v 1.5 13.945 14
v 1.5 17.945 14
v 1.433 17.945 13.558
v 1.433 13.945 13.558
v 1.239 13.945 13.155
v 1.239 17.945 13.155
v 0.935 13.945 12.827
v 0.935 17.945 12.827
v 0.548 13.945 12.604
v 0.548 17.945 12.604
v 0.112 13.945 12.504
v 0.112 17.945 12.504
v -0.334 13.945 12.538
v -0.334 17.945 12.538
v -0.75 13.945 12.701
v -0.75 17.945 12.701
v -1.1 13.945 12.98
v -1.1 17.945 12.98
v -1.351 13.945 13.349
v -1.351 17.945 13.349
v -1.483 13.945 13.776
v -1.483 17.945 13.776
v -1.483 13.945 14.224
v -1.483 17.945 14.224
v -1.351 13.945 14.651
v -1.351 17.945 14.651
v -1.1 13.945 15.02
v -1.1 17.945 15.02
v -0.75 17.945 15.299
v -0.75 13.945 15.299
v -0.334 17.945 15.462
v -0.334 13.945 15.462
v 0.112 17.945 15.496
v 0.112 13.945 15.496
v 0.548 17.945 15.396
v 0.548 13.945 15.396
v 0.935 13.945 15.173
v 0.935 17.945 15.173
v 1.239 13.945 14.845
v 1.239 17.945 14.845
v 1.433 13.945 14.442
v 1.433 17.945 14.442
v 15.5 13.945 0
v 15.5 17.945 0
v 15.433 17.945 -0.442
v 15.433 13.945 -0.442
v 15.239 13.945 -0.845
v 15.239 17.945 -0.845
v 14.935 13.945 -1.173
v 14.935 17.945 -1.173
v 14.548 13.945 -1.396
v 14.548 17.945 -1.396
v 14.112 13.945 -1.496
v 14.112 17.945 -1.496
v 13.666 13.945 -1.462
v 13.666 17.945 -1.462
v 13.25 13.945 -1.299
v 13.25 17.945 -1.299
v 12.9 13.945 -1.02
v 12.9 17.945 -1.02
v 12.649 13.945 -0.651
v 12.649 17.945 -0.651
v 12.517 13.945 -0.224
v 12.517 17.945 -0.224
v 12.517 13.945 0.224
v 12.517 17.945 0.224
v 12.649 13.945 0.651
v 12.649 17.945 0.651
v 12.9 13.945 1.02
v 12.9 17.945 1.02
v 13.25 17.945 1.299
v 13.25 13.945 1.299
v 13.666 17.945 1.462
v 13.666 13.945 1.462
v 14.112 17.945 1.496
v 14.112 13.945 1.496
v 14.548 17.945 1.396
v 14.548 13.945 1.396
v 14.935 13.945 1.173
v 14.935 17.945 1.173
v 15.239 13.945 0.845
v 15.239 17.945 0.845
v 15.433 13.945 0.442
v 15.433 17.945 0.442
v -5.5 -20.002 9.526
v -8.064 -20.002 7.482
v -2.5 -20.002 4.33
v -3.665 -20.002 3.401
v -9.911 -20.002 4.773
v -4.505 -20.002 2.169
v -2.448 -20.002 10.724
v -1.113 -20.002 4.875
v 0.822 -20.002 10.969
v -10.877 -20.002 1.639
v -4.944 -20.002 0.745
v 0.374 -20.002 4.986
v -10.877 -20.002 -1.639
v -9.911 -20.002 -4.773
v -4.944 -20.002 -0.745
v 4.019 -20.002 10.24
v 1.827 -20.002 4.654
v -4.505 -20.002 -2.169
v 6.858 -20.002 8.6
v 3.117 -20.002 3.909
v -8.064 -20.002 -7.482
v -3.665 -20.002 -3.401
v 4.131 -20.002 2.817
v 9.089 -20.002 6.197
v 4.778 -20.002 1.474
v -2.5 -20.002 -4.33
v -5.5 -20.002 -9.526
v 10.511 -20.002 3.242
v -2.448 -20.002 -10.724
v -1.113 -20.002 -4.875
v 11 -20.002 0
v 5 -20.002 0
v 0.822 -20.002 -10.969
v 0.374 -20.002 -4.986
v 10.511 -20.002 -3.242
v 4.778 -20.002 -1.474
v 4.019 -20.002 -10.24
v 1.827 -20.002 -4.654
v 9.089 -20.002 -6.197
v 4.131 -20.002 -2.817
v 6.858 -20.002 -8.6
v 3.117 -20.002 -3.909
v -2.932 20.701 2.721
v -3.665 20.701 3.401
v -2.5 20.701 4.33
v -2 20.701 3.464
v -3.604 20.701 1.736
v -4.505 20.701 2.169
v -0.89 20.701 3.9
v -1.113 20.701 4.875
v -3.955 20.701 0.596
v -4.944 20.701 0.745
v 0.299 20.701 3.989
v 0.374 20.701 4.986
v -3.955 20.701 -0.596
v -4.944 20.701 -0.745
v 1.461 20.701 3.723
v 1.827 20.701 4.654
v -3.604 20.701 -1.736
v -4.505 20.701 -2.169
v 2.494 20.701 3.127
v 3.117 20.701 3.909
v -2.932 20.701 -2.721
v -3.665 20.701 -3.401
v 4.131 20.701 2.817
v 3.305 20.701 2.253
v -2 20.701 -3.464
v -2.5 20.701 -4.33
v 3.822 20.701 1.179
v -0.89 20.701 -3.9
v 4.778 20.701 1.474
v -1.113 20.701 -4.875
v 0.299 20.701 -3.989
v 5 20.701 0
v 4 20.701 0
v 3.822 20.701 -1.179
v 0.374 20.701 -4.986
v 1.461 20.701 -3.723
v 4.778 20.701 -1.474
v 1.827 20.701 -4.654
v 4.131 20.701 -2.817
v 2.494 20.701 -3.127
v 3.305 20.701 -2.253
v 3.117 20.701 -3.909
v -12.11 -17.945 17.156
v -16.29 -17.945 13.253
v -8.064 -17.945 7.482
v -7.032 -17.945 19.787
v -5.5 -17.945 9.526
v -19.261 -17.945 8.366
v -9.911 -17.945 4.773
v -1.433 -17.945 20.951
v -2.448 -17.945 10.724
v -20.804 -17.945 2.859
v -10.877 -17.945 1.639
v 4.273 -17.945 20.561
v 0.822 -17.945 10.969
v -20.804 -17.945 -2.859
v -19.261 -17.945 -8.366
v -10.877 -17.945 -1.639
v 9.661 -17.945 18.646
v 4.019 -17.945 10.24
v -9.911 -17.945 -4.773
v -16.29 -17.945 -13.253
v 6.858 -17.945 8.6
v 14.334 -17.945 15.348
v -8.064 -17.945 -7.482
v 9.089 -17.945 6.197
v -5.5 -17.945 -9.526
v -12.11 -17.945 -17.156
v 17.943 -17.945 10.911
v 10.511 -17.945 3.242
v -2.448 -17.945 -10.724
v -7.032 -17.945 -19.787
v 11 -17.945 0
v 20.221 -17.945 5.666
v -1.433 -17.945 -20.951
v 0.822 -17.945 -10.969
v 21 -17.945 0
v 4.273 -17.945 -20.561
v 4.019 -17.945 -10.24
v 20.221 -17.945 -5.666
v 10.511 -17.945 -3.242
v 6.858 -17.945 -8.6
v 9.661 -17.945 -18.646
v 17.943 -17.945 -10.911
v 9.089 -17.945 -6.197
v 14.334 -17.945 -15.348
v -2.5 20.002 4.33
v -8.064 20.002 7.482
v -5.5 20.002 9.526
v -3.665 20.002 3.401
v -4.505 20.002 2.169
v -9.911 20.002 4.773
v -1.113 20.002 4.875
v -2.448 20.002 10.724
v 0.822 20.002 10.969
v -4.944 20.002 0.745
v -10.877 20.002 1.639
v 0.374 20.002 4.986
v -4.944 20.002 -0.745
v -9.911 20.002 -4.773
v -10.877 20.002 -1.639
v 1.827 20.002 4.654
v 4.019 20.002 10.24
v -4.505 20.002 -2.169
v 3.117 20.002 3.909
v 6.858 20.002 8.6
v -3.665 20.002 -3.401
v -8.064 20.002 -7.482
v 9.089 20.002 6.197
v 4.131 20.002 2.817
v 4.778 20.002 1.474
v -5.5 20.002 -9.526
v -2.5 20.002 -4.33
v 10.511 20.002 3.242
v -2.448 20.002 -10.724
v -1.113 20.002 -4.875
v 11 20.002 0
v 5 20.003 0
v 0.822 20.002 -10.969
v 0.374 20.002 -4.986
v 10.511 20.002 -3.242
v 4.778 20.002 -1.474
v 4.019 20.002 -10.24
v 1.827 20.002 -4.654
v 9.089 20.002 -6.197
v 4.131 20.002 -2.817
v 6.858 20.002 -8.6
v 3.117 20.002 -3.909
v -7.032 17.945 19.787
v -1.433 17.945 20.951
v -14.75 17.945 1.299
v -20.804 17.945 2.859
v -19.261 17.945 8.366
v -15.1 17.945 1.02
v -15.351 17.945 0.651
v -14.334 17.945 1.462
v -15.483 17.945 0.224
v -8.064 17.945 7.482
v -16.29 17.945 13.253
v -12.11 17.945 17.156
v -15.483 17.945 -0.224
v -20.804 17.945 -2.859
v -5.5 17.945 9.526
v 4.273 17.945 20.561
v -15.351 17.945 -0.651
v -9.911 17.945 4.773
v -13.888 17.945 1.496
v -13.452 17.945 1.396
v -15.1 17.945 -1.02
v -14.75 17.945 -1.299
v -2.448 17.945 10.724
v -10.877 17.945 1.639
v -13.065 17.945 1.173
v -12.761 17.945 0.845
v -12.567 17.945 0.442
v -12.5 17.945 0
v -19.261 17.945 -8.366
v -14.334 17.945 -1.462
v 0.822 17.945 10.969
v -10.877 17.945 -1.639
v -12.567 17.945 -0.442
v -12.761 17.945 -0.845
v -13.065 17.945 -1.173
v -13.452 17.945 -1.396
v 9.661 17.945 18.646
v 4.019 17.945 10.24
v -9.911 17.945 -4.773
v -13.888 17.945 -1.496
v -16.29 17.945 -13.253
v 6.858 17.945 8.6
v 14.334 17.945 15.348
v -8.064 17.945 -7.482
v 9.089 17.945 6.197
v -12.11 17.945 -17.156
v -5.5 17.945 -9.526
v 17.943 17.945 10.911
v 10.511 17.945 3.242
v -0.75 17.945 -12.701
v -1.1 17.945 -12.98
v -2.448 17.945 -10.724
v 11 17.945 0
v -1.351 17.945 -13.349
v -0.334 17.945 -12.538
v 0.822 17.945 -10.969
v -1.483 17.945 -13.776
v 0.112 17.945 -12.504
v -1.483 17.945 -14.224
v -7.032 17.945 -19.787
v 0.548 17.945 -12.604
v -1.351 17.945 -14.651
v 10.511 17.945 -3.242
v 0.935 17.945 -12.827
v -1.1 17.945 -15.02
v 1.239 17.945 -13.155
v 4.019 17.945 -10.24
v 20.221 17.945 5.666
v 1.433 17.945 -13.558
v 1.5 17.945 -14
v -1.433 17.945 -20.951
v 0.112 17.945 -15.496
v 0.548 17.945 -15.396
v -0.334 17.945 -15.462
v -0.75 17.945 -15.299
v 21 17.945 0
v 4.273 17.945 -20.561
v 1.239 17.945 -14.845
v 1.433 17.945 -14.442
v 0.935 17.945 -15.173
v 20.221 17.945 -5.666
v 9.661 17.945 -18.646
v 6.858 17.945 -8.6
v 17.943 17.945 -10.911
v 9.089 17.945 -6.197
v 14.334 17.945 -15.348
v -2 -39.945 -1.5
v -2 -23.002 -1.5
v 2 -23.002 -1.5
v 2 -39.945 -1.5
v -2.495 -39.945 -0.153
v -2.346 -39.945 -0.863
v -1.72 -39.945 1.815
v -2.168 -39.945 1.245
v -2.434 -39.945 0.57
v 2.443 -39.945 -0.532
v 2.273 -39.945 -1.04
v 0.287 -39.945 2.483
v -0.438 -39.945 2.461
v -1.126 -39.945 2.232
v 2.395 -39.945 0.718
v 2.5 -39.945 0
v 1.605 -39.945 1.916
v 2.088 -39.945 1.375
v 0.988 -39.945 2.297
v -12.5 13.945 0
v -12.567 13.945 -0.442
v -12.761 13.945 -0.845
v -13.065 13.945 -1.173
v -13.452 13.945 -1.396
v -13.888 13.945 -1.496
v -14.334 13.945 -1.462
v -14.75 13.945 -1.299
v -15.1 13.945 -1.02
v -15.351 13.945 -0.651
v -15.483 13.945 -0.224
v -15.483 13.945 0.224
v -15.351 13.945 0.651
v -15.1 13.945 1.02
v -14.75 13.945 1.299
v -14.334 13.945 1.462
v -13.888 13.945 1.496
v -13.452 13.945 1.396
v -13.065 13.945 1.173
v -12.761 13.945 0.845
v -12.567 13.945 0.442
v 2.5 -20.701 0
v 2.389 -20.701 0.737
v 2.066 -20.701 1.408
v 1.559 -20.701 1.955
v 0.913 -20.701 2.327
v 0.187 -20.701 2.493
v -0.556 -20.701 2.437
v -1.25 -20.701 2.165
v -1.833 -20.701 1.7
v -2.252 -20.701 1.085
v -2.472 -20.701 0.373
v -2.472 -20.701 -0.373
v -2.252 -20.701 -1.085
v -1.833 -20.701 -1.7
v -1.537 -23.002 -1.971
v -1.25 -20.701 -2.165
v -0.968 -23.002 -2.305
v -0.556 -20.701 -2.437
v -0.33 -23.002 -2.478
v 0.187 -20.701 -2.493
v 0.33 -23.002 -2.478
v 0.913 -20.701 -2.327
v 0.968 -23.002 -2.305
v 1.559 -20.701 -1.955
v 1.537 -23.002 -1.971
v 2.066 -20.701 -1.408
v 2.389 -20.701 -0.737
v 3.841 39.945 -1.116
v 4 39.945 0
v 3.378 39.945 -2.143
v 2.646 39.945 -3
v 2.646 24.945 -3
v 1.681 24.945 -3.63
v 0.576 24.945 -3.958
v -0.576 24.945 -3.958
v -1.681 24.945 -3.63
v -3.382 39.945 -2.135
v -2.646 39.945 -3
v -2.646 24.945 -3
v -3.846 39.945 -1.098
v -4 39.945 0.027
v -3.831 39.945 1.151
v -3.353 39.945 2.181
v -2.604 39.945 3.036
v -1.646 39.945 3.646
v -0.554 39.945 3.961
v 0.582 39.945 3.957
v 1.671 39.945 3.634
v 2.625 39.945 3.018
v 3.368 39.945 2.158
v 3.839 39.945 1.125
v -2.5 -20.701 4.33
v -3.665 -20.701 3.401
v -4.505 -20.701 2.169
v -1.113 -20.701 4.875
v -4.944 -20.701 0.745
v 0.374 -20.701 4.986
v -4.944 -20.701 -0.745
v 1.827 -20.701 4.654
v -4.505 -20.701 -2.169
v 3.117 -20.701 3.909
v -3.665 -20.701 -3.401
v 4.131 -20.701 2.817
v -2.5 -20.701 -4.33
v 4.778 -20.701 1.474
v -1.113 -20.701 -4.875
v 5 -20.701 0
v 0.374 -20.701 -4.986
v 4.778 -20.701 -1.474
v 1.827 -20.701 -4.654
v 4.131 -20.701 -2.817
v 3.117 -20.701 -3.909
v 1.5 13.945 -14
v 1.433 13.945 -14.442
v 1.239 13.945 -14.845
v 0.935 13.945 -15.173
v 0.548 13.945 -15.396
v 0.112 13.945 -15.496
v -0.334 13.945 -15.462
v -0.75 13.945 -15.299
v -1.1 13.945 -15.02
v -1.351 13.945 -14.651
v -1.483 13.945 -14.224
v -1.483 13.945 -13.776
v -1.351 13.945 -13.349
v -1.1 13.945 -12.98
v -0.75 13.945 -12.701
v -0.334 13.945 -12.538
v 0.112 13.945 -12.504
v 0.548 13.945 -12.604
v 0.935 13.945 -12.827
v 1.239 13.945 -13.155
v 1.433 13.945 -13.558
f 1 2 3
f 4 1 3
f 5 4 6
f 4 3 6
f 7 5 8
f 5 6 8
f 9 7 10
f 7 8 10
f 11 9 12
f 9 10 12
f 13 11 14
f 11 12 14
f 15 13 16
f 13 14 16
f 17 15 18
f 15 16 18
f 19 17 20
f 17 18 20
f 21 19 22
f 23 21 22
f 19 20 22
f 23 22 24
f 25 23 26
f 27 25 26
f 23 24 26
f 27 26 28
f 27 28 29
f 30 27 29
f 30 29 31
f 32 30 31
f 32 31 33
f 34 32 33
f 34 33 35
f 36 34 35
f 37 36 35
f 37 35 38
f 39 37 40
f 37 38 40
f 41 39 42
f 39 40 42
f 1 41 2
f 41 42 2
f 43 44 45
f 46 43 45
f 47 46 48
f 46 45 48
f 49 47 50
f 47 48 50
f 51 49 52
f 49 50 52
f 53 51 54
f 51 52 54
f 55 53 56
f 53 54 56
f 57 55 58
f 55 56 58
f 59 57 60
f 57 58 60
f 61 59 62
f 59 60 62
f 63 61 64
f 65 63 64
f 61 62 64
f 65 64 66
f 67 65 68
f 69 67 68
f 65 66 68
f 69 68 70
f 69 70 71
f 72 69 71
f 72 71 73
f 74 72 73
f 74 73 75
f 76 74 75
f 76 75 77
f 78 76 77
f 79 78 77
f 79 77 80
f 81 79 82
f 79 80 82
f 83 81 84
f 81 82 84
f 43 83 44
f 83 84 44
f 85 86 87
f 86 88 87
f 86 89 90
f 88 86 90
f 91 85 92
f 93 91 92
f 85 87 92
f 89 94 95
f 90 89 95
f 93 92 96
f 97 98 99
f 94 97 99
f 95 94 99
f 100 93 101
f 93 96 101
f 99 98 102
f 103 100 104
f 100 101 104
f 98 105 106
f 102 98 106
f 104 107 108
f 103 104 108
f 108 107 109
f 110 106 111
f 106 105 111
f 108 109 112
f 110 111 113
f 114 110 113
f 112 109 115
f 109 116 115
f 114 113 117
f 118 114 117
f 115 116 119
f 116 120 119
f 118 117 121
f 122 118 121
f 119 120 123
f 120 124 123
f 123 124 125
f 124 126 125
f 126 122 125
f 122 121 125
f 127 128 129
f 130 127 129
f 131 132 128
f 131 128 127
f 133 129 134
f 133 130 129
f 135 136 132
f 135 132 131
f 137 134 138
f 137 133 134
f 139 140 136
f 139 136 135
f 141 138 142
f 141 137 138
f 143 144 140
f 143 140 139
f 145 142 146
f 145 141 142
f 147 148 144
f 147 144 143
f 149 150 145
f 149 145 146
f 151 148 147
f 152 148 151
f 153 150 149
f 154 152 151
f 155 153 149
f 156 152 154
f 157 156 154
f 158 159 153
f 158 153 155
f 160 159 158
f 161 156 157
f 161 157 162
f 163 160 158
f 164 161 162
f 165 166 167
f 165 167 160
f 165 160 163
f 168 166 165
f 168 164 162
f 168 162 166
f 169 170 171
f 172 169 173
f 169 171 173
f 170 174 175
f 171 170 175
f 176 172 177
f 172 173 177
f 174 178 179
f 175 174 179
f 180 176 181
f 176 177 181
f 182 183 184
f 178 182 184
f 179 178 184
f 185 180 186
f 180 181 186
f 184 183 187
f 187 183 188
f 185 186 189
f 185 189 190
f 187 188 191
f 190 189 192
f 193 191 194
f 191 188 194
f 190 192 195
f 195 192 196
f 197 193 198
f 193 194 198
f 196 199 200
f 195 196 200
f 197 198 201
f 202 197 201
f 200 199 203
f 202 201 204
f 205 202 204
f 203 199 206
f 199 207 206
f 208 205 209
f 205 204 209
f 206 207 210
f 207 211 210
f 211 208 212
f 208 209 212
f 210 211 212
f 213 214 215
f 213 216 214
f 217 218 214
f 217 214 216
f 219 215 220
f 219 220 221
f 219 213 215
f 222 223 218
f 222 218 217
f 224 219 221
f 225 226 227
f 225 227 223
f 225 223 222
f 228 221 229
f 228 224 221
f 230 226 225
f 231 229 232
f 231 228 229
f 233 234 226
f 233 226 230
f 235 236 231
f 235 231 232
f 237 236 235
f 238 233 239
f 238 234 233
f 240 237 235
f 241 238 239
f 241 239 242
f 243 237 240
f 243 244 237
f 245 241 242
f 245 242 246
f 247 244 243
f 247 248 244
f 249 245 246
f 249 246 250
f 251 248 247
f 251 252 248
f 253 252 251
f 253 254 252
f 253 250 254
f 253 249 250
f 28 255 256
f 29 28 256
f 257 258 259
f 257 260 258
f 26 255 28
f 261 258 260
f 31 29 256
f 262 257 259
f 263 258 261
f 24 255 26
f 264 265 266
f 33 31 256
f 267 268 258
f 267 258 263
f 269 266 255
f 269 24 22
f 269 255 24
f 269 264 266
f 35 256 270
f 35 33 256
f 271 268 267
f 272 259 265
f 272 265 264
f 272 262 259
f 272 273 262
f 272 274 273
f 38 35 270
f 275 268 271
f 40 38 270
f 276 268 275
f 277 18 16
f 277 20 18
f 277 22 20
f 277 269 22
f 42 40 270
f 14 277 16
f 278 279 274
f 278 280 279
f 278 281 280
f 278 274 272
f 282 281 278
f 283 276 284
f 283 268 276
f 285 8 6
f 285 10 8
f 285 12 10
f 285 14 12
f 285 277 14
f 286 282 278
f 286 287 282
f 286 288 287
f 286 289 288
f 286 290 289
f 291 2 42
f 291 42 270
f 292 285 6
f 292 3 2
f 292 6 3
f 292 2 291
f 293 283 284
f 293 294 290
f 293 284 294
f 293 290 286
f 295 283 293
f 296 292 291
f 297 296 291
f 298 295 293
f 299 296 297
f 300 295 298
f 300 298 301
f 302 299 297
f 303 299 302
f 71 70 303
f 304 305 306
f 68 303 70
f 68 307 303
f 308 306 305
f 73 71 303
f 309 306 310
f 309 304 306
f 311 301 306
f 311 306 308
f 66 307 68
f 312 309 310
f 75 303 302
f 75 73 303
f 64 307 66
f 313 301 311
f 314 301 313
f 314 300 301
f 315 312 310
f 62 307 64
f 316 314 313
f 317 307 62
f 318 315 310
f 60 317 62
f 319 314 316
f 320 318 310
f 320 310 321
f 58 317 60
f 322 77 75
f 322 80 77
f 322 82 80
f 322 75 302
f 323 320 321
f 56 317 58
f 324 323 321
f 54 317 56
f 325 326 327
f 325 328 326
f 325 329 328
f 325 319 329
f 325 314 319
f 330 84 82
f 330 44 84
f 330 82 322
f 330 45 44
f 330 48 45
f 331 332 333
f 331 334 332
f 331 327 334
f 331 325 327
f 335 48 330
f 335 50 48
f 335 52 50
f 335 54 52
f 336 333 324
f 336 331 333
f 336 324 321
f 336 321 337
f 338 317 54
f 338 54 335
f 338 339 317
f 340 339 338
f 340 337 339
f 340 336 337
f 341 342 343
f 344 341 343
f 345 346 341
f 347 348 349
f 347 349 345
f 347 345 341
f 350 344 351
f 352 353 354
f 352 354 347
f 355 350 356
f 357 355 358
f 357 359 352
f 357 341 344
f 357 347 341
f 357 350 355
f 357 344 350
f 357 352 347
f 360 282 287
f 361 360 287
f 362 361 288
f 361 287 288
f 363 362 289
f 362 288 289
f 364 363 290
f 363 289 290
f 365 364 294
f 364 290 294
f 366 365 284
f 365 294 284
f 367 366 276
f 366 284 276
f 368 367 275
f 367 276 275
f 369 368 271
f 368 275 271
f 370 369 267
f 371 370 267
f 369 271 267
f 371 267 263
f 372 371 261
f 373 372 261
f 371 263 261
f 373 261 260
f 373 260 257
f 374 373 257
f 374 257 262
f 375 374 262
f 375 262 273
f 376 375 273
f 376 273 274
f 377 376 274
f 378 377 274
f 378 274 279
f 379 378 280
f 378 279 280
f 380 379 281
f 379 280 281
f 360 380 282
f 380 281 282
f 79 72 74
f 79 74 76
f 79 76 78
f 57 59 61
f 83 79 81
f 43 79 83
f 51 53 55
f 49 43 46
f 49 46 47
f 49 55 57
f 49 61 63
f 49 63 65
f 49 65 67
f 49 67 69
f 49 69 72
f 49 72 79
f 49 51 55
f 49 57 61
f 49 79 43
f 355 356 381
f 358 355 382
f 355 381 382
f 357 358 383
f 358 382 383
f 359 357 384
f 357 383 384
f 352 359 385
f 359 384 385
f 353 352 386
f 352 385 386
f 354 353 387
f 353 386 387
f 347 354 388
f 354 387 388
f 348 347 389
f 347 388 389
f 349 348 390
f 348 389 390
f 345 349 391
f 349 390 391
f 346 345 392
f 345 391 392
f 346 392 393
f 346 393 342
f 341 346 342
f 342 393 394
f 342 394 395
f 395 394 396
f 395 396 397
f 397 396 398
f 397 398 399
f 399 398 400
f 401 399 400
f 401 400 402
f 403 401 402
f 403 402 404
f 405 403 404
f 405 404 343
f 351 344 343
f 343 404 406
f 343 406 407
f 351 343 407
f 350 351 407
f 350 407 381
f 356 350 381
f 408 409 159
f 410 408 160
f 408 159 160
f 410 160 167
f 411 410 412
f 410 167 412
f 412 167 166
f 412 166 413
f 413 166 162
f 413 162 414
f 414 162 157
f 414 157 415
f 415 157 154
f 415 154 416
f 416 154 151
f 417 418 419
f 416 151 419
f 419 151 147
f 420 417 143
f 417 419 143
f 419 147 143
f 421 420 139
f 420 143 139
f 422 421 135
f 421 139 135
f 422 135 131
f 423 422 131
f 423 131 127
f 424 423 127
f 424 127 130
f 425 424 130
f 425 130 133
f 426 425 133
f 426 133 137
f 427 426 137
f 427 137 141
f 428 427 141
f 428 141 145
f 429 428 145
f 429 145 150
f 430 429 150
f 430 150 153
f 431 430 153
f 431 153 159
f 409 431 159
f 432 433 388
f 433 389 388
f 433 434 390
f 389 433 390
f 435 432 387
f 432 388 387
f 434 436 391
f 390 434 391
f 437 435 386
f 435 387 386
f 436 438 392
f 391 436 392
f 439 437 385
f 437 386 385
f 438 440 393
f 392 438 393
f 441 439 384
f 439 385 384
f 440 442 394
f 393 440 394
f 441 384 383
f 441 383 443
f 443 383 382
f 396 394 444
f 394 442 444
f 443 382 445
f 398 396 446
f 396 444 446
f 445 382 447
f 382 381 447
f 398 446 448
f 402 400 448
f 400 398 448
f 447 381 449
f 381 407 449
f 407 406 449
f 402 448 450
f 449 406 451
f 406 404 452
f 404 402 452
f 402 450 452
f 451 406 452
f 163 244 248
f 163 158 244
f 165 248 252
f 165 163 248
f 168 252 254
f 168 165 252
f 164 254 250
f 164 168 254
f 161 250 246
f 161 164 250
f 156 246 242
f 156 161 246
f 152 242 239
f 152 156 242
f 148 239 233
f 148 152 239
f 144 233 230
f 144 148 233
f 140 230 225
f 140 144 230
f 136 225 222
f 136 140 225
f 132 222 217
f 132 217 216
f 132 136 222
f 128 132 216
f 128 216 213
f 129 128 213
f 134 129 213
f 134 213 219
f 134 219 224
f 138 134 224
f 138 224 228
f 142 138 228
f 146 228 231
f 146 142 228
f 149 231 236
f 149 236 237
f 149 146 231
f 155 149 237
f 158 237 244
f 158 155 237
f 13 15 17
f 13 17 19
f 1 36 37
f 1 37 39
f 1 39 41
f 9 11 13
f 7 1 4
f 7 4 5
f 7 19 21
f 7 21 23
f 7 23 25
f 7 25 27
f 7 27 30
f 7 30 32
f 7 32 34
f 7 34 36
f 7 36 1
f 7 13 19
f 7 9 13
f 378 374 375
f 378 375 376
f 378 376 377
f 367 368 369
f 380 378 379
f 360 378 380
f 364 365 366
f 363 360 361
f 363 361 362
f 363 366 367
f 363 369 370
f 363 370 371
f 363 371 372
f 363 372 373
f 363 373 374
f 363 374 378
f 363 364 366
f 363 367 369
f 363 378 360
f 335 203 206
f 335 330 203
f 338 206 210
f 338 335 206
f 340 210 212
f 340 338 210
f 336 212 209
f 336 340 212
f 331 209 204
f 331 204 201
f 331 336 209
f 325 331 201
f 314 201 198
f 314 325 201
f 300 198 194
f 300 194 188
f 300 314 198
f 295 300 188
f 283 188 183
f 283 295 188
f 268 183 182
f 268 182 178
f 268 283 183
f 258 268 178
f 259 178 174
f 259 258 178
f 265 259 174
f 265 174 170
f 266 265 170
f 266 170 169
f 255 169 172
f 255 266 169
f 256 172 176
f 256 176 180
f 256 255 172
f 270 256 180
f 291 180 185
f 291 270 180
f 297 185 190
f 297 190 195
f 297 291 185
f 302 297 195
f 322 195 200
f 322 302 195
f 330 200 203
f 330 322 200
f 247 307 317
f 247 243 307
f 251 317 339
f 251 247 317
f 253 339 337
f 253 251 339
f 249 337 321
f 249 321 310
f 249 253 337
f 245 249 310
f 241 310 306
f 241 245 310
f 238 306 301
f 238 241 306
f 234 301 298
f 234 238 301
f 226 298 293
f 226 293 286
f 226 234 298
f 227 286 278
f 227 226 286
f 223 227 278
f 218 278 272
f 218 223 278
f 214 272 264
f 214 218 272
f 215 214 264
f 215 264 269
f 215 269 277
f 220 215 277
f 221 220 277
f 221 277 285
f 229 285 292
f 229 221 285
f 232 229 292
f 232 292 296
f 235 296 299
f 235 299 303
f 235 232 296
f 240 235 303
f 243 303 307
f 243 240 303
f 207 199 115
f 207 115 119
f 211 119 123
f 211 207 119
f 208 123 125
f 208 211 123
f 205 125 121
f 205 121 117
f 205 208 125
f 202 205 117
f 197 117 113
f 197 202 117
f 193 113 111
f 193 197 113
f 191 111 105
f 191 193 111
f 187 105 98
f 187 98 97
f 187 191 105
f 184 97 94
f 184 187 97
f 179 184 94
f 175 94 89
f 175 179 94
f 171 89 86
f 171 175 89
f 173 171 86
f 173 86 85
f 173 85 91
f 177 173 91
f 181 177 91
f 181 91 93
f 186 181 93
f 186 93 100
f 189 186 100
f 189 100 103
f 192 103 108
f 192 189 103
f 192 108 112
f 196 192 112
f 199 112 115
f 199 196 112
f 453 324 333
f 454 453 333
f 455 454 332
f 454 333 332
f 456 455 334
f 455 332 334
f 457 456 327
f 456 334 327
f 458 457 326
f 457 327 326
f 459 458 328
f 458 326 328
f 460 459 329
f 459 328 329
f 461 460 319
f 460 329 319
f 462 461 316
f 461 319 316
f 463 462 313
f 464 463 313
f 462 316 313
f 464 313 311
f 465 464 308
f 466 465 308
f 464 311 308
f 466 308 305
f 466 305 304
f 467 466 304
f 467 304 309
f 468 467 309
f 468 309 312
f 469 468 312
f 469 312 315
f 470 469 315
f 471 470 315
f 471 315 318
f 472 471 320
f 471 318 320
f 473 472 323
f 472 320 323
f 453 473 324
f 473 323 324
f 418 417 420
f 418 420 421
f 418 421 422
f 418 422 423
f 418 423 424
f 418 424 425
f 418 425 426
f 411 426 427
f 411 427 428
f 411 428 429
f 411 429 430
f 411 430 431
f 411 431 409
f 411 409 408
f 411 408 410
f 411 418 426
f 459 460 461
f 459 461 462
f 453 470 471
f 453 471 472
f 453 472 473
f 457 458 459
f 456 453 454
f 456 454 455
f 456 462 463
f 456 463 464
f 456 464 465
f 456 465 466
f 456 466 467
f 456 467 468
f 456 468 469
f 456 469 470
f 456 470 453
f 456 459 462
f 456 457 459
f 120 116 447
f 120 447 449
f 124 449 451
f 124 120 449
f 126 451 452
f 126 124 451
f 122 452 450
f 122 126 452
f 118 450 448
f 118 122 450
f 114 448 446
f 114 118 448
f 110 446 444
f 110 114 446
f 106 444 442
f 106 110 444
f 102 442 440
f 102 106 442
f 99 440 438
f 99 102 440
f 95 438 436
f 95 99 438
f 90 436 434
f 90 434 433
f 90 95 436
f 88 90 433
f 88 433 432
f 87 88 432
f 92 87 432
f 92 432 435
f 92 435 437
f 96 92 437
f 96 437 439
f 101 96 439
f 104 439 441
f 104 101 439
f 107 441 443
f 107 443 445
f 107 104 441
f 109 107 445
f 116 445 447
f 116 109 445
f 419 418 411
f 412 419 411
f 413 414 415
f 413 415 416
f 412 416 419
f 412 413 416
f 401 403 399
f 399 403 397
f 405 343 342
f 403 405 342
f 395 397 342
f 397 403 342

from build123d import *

# Parameters (mm, degrees)
SKETCH1_R           = 21
BOSS_EXTRUDE1_DEPTH = 17.9451
BOSS_EXTRUDE2_START = -17.9451
SKETCH2_R           = 11
BOSS_EXTRUDE2_DEPTH = 20.0025
SKETCH3_R           = 4
BOSS_EXTRUDE4_DEPTH = 19.9426
CUT_EXTRUDE1_DEPTH  = 15
SKETCH5_R           = 1.5
CUT_EXTRUDE2_DEPTH  = 4
SKETCH6_R           = 2.5
BOSS_EXTRUDE5_DEPTH = 19.9426
CUT_EXTRUDE3_DEPTH  = 16.9426
SKETCH9_R           = 5
BOSS_EXTRUDE6_DEPTH = 20.701


with BuildPart() as part:
    # Sketch1 → Boss-Extrude1 (new body, symmetric)
    with BuildSketch(Plane(origin=(0, 0, 0), x_dir=(1, 0, 0), z_dir=(0, 1, 0))):
        Circle(SKETCH1_R)
    extrude(amount=BOSS_EXTRUDE1_DEPTH, both=True)

    # Sketch2 → Boss-Extrude2 (add, symmetric)
    with BuildSketch(Plane(origin=(0, 17.9451, 0), x_dir=(1, 0, 0), z_dir=(0, 1, 0)).offset(BOSS_EXTRUDE2_START)):
        Circle(SKETCH2_R)
    extrude(amount=BOSS_EXTRUDE2_DEPTH, both=True)

    # Sketch3 → Boss-Extrude4 (add)
    with BuildSketch(Plane(origin=(0, 20.0025, 0), x_dir=(1, 0, 0), z_dir=(0, 1, 0))):
        Circle(SKETCH3_R)
    extrude(amount=BOSS_EXTRUDE4_DEPTH)

    # Sketch4 → Cut-Extrude1 (cut)
    with BuildSketch(Plane(origin=(0, 39.9451, 0), x_dir=(1, 0, 0), z_dir=(0, 1, 0))):
        with BuildLine():
            Line((-2.645751311, 3), (2.645751311, 3))
            ThreePointArc((2.645751311, 3), (0, 4), (-2.645751311, 3))
        make_face()
    extrude(amount=-CUT_EXTRUDE1_DEPTH, mode=Mode.SUBTRACT)

    # Sketch5 → Cut-Extrude2 (cut)
    with BuildSketch(Plane(origin=(0, 17.9451, 0), x_dir=(1, 0, 0), z_dir=(0, 1, 0))):
        with Locations((0, 14)):
            Circle(SKETCH5_R)
        with Locations((-14, 0)):
            Circle(SKETCH5_R)
        with Locations((0, -14)):
            Circle(SKETCH5_R)
        with Locations((14, 0)):
            Circle(SKETCH5_R)
    extrude(amount=-CUT_EXTRUDE2_DEPTH, mode=Mode.SUBTRACT)

    # Sketch6 → Boss-Extrude5 (add)
    with BuildSketch(Plane.XZ.offset(20.0025)):
        Circle(SKETCH6_R)
    extrude(amount=BOSS_EXTRUDE5_DEPTH)

    # Sketch7 → Cut-Extrude3 (cut)
    with BuildSketch(Plane.XZ.offset(39.9451)):
        with BuildLine():
            Line((-2, -1.5), (2, -1.5))
            ThreePointArc((2, -1.5), (0, -2.5), (-2, -1.5))
        make_face()
    extrude(amount=-CUT_EXTRUDE3_DEPTH, mode=Mode.SUBTRACT)

    # Sketch9 → Boss-Extrude6 (add, symmetric)
    with BuildSketch(Plane(origin=(0, 0, 0), x_dir=(1, 0, 0), z_dir=(0, 1, 0))):
        Circle(SKETCH9_R)
    extrude(amount=BOSS_EXTRUDE6_DEPTH, both=True)


solid = part.part
